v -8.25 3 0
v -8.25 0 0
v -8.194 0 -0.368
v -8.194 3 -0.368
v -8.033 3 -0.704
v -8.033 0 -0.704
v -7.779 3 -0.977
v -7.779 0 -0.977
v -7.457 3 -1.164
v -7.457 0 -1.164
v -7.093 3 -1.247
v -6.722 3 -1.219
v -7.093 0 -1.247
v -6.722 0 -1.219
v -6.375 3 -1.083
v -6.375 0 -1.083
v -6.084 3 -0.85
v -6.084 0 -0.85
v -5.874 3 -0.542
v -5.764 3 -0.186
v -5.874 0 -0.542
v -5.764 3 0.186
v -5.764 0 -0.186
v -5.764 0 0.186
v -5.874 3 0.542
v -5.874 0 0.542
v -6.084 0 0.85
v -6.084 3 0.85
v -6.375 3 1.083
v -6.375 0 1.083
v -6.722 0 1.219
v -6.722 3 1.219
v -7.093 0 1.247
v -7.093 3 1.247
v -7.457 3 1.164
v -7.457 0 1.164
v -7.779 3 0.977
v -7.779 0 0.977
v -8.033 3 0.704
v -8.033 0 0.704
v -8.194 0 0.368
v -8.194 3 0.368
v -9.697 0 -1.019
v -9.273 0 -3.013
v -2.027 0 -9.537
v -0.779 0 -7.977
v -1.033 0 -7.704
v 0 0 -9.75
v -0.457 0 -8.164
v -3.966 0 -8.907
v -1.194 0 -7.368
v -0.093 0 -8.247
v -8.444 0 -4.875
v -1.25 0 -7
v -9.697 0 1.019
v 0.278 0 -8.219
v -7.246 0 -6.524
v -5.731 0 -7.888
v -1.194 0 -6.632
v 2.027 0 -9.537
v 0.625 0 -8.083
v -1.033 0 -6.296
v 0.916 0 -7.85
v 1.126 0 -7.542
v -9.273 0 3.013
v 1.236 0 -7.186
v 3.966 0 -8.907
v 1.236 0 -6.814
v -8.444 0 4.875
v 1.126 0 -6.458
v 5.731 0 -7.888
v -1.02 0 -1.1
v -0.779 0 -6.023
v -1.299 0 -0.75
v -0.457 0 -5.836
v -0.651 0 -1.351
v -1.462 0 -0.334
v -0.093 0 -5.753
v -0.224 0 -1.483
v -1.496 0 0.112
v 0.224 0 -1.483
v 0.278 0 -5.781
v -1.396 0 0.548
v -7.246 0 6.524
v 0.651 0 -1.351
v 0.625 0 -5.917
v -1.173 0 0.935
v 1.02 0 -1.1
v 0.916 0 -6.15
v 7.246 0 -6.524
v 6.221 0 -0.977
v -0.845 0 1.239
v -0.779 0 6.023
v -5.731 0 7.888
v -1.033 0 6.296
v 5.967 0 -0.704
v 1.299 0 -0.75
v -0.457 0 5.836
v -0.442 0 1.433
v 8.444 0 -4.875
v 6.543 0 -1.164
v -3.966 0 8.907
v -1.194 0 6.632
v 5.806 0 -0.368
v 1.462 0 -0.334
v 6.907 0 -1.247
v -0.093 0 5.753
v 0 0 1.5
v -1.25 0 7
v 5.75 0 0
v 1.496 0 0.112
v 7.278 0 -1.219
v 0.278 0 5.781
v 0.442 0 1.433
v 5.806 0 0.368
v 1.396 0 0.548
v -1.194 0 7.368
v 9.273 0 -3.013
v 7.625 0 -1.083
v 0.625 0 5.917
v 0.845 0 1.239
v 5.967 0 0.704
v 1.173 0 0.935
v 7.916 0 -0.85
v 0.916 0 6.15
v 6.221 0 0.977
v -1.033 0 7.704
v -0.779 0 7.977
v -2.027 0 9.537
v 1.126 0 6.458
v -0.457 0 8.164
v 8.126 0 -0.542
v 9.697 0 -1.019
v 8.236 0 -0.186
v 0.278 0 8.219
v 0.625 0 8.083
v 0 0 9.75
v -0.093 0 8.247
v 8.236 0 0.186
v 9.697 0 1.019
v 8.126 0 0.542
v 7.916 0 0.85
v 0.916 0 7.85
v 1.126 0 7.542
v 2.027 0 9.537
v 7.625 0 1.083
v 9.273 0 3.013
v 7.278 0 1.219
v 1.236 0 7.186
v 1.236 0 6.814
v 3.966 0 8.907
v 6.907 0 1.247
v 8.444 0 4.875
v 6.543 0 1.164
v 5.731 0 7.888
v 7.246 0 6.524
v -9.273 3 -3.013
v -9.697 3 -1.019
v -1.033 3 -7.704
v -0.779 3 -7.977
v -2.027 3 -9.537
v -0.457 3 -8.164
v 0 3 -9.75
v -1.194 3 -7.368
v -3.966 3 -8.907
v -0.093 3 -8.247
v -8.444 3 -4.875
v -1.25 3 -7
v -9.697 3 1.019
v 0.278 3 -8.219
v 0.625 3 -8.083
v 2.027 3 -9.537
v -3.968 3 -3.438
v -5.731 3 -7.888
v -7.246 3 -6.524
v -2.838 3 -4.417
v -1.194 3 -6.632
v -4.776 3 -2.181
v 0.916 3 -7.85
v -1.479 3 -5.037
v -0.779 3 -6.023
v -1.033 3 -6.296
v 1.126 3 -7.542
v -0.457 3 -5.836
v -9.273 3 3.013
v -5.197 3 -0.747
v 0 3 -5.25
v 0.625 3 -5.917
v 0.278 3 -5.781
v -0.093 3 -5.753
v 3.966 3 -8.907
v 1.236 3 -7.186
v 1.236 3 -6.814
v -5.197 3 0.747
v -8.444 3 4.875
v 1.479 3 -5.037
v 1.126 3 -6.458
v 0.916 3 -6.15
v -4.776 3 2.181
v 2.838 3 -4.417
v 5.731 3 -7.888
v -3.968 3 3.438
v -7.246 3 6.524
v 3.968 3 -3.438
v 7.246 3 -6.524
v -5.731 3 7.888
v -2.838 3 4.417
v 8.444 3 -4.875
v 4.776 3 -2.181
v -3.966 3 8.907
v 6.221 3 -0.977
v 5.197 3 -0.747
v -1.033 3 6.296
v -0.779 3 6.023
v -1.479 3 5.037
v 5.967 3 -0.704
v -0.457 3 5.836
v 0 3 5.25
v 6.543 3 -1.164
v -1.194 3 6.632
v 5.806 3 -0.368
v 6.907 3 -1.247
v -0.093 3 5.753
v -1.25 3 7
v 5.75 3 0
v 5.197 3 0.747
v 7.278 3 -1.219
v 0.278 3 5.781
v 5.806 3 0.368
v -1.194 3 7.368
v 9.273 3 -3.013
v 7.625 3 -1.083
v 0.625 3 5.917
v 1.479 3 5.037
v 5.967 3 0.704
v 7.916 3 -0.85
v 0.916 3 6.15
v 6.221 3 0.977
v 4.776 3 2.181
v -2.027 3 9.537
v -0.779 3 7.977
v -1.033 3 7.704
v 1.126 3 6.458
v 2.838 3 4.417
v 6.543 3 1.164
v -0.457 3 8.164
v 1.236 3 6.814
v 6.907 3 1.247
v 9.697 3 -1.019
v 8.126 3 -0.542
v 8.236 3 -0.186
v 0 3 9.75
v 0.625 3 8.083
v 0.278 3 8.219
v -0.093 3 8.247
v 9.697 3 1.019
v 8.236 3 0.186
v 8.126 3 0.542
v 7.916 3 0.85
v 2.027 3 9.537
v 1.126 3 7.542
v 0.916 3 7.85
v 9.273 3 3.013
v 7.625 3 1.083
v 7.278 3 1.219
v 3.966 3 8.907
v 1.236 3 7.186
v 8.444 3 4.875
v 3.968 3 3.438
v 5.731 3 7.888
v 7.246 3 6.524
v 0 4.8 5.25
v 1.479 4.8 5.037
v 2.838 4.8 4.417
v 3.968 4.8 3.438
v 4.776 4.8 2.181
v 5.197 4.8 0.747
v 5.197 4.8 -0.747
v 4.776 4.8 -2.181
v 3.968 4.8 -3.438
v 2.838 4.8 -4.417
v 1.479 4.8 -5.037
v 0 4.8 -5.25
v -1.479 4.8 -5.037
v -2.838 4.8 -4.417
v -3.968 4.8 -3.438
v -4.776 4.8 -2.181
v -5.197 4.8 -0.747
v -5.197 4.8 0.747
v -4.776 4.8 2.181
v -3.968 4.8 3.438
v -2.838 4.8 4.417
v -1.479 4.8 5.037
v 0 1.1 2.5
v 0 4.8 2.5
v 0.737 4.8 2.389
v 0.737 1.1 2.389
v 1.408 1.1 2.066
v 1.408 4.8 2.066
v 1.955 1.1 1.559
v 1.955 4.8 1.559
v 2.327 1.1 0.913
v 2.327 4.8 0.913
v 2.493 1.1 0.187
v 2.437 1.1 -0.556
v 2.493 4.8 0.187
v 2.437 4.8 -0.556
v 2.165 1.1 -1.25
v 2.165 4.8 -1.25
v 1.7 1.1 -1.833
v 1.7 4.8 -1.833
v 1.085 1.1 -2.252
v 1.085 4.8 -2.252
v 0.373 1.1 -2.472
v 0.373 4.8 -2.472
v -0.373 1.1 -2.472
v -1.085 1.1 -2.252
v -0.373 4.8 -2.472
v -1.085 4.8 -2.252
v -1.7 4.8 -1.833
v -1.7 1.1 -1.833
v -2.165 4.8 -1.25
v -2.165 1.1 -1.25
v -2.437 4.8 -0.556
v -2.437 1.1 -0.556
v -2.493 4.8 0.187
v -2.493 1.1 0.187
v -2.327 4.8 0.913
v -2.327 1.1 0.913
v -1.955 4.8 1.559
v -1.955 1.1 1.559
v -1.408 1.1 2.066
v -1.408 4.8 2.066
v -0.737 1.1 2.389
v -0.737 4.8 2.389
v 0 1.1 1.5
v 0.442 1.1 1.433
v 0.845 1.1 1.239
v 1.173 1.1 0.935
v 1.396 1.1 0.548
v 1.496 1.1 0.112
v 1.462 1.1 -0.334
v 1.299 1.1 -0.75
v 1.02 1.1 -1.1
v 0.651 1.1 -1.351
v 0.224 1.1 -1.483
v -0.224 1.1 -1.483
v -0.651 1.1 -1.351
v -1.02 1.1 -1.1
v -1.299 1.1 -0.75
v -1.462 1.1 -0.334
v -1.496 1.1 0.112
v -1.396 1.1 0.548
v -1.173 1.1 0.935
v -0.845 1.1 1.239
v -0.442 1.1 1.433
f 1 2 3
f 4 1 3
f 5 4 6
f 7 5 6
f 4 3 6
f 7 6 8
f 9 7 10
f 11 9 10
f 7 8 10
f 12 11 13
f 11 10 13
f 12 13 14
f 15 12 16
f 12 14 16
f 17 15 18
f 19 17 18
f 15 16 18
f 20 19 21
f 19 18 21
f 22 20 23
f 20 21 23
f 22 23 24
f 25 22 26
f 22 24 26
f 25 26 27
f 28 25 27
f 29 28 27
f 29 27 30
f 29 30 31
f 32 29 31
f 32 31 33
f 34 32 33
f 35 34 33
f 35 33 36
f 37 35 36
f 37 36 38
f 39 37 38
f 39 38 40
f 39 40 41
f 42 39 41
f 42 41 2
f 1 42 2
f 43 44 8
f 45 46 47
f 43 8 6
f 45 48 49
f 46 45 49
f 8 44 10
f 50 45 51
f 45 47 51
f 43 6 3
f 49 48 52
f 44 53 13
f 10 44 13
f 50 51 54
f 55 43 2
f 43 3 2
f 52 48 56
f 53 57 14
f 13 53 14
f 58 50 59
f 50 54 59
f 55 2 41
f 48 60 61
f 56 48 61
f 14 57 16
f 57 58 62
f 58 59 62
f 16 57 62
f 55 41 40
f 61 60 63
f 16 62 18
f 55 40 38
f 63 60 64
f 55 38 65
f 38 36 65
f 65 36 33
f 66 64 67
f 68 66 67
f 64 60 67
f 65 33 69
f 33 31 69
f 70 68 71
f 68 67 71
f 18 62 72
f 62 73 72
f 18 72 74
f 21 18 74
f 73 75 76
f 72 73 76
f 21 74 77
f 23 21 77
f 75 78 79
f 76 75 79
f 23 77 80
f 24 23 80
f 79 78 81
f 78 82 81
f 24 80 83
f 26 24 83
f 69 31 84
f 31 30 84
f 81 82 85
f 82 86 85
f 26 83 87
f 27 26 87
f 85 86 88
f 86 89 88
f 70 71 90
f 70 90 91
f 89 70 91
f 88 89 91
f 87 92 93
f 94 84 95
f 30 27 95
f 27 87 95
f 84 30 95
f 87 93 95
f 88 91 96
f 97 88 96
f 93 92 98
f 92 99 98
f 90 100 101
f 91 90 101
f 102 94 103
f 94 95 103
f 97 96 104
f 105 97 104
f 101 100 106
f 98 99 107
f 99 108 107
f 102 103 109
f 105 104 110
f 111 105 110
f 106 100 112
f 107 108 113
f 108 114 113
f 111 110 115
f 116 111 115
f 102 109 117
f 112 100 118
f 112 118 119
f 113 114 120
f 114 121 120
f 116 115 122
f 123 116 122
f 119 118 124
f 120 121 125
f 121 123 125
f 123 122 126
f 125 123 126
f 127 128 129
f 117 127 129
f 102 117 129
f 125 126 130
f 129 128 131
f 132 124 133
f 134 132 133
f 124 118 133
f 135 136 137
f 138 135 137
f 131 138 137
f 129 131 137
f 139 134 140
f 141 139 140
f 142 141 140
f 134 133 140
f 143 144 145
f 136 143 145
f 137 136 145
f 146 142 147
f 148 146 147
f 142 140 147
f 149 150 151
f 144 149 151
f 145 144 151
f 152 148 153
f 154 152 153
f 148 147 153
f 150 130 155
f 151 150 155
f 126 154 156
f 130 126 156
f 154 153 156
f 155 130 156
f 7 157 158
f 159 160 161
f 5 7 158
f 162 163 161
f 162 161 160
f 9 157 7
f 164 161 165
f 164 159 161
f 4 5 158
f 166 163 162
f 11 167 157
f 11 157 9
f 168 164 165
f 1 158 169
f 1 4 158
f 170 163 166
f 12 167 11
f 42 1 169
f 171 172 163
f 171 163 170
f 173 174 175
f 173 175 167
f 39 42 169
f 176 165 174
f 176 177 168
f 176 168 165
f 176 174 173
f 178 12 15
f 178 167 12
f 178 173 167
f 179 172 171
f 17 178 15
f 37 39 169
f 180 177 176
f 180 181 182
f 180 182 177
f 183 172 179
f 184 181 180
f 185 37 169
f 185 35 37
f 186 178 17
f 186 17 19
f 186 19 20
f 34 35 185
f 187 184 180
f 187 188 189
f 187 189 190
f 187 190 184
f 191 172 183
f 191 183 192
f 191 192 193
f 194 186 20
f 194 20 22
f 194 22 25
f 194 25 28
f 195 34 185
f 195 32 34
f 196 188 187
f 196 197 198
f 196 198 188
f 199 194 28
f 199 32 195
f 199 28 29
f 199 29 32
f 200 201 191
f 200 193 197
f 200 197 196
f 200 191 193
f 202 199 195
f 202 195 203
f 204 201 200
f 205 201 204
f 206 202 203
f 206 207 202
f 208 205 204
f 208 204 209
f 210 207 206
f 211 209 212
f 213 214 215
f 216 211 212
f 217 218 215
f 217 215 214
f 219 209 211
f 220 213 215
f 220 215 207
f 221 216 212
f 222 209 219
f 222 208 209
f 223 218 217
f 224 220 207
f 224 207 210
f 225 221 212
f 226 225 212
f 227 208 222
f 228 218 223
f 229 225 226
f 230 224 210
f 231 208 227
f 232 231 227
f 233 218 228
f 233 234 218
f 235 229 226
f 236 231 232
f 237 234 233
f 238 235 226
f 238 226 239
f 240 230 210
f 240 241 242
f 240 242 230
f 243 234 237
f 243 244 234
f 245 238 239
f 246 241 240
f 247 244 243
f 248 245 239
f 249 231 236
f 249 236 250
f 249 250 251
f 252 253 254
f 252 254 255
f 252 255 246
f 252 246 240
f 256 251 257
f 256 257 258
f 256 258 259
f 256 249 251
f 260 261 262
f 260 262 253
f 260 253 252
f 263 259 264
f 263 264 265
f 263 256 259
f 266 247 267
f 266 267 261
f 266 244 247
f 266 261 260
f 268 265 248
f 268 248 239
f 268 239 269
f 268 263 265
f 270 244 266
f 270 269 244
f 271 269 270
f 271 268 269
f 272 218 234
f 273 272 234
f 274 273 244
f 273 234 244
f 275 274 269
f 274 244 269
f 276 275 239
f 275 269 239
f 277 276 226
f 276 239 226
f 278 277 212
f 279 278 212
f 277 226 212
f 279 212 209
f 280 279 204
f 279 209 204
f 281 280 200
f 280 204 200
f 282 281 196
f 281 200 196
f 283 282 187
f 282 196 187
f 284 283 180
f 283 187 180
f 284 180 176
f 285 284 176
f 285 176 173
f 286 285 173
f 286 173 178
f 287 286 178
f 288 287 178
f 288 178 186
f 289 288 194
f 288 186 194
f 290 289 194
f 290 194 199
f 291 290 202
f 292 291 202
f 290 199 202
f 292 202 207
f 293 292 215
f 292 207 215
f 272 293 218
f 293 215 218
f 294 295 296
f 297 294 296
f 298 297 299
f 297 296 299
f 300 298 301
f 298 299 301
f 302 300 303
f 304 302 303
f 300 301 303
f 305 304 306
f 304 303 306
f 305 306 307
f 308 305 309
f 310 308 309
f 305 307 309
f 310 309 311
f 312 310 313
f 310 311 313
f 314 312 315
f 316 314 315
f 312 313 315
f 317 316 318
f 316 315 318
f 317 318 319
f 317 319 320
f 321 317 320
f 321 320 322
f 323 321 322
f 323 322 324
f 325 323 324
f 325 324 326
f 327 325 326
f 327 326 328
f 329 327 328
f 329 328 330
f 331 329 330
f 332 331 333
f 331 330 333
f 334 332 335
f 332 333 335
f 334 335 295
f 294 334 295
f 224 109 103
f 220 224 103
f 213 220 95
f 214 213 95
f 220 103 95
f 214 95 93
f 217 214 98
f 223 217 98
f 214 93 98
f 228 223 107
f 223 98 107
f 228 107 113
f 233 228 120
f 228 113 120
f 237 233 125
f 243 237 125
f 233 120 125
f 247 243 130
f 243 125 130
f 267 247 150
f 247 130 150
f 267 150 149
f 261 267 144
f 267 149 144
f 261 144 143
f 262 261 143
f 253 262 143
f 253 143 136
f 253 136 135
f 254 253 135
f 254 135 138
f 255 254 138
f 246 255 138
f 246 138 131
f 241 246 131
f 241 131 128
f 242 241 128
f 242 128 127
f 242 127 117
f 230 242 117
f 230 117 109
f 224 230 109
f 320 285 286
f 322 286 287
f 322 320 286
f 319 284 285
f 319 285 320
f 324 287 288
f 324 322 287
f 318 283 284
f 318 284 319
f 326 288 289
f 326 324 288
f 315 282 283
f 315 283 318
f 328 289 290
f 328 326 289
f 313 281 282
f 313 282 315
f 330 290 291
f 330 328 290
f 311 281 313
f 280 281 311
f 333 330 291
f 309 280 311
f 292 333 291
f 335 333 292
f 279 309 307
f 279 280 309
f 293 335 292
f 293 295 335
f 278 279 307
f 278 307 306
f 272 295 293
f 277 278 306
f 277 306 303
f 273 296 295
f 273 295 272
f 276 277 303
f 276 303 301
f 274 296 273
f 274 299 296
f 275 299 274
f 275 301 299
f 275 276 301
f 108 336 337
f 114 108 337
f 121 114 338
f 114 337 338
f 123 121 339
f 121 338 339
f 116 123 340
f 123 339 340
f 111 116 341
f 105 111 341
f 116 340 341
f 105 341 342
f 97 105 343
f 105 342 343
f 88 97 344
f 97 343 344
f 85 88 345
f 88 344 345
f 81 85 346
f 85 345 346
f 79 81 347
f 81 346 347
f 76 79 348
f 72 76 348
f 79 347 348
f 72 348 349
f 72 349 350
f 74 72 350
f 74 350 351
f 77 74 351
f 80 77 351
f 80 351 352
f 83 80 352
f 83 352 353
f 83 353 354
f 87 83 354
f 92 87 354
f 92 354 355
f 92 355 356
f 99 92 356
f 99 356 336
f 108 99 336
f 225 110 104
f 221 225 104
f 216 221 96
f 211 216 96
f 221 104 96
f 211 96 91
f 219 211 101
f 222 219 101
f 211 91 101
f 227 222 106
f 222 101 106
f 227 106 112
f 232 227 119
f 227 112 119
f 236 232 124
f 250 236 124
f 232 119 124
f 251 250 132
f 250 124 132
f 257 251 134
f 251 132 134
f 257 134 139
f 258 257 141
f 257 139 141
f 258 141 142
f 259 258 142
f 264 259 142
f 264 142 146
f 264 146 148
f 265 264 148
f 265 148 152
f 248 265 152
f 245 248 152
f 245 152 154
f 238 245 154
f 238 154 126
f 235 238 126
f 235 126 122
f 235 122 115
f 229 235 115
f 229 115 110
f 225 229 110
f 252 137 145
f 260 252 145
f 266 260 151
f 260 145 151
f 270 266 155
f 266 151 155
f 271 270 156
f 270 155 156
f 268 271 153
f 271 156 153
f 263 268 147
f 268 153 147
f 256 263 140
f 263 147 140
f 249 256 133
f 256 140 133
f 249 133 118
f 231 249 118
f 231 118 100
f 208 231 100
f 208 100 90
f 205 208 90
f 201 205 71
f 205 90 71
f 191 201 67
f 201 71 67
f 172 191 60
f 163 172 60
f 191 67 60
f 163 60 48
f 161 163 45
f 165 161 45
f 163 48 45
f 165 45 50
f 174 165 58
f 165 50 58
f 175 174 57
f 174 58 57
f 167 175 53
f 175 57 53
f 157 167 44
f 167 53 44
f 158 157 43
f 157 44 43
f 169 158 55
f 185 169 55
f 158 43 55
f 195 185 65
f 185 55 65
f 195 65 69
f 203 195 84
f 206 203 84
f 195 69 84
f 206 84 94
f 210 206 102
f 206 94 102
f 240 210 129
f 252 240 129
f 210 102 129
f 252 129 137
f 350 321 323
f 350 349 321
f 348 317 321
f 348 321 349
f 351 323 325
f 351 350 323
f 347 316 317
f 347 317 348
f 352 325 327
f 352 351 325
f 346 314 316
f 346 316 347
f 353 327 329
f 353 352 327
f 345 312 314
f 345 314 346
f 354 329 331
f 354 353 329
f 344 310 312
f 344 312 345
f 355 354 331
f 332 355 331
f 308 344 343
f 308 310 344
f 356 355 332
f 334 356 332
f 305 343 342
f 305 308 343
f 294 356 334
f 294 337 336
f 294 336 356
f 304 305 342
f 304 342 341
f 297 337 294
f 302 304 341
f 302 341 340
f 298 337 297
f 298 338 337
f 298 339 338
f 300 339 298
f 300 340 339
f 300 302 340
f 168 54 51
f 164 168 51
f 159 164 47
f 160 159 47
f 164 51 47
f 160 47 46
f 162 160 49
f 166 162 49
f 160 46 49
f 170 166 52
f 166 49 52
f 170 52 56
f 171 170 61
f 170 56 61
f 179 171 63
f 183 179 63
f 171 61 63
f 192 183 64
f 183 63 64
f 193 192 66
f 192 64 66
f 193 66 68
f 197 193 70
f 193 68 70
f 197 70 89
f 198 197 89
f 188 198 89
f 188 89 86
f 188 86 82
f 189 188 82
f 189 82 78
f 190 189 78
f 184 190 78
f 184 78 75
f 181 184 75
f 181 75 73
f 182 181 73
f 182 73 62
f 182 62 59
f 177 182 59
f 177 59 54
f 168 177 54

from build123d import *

# Parameters (mm, degrees)
SKETCH_1_R             = 9.75
EXTRUDE_1_DEPTH        = 3
SKETCH_2_R             = 5.25
EXTRUDE_2_DEPTH        = 1.8
SKETCH_3_R             = 2.5
CUT_EXTRUDE_1_DEPTH    = 3.7
HOLE_WIZARD_M3_1_D     = 2.5
HOLE_WIZARD_M3_1_DEPTH = 8.5
HOLE_WIZARD_M3_1_TIP   = 0.751075774
SKETCH_10_R            = 1.5
CUT_EXTRUDE_2_DEPTH    = 3.7


with BuildPart() as part:
    # 草图1 → 凸台-拉伸1 (new body)
    with BuildSketch(Plane(origin=(0, 0, 0), x_dir=(1, 0, 0), z_dir=(0, 1, 0))):
        with Locations(Location((0, 0, 0), (0, 0, 270))):
            Circle(SKETCH_1_R)
    extrude(amount=EXTRUDE_1_DEPTH)

    # 草图2 → 凸台-拉伸2 (add)
    with BuildSketch(Plane(origin=(0, 3, 0), x_dir=(1, 0, 0), z_dir=(0, 1, 0))):
        with Locations(Location((0, 0, 0), (0, 0, 270))):
            Circle(SKETCH_2_R)
    extrude(amount=EXTRUDE_2_DEPTH)

    # 草图3 → 切除-拉伸1 (cut)
    with BuildSketch(Plane(origin=(0, 4.8, 0), x_dir=(1, 0, 0), z_dir=(0, 1, 0))):
        with Locations(Location((0, 0, 0), (0, 0, 270))):
            Circle(SKETCH_3_R)
    extrude(amount=-CUT_EXTRUDE_1_DEPTH, mode=Mode.SUBTRACT)

    # M3 螺纹孔1
    with Locations(Plane(origin=(0, 3, 0), x_dir=(1, 0, 0), z_dir=(0, 1, 0))):
        with Locations((0, 7), (7, 0), (0, -7), (-7, 0)):
            Hole(HOLE_WIZARD_M3_1_D / 2, depth=HOLE_WIZARD_M3_1_DEPTH)
            with Locations((0, 0, -(HOLE_WIZARD_M3_1_DEPTH + HOLE_WIZARD_M3_1_TIP / 2))):  # 118° drill point
                Cone(0, HOLE_WIZARD_M3_1_D / 2, HOLE_WIZARD_M3_1_TIP, mode=Mode.SUBTRACT)

    # 草图10 → 切除-拉伸2 (cut)
    with BuildSketch(Plane(origin=(0, 1.1, 0), x_dir=(1, 0, 0), z_dir=(0, 1, 0))):
        with Locations(Location((0, 0, 0), (0, 0, 270))):
            Circle(SKETCH_10_R)
    extrude(amount=-CUT_EXTRUDE_2_DEPTH, mode=Mode.SUBTRACT)


solid = part.part
